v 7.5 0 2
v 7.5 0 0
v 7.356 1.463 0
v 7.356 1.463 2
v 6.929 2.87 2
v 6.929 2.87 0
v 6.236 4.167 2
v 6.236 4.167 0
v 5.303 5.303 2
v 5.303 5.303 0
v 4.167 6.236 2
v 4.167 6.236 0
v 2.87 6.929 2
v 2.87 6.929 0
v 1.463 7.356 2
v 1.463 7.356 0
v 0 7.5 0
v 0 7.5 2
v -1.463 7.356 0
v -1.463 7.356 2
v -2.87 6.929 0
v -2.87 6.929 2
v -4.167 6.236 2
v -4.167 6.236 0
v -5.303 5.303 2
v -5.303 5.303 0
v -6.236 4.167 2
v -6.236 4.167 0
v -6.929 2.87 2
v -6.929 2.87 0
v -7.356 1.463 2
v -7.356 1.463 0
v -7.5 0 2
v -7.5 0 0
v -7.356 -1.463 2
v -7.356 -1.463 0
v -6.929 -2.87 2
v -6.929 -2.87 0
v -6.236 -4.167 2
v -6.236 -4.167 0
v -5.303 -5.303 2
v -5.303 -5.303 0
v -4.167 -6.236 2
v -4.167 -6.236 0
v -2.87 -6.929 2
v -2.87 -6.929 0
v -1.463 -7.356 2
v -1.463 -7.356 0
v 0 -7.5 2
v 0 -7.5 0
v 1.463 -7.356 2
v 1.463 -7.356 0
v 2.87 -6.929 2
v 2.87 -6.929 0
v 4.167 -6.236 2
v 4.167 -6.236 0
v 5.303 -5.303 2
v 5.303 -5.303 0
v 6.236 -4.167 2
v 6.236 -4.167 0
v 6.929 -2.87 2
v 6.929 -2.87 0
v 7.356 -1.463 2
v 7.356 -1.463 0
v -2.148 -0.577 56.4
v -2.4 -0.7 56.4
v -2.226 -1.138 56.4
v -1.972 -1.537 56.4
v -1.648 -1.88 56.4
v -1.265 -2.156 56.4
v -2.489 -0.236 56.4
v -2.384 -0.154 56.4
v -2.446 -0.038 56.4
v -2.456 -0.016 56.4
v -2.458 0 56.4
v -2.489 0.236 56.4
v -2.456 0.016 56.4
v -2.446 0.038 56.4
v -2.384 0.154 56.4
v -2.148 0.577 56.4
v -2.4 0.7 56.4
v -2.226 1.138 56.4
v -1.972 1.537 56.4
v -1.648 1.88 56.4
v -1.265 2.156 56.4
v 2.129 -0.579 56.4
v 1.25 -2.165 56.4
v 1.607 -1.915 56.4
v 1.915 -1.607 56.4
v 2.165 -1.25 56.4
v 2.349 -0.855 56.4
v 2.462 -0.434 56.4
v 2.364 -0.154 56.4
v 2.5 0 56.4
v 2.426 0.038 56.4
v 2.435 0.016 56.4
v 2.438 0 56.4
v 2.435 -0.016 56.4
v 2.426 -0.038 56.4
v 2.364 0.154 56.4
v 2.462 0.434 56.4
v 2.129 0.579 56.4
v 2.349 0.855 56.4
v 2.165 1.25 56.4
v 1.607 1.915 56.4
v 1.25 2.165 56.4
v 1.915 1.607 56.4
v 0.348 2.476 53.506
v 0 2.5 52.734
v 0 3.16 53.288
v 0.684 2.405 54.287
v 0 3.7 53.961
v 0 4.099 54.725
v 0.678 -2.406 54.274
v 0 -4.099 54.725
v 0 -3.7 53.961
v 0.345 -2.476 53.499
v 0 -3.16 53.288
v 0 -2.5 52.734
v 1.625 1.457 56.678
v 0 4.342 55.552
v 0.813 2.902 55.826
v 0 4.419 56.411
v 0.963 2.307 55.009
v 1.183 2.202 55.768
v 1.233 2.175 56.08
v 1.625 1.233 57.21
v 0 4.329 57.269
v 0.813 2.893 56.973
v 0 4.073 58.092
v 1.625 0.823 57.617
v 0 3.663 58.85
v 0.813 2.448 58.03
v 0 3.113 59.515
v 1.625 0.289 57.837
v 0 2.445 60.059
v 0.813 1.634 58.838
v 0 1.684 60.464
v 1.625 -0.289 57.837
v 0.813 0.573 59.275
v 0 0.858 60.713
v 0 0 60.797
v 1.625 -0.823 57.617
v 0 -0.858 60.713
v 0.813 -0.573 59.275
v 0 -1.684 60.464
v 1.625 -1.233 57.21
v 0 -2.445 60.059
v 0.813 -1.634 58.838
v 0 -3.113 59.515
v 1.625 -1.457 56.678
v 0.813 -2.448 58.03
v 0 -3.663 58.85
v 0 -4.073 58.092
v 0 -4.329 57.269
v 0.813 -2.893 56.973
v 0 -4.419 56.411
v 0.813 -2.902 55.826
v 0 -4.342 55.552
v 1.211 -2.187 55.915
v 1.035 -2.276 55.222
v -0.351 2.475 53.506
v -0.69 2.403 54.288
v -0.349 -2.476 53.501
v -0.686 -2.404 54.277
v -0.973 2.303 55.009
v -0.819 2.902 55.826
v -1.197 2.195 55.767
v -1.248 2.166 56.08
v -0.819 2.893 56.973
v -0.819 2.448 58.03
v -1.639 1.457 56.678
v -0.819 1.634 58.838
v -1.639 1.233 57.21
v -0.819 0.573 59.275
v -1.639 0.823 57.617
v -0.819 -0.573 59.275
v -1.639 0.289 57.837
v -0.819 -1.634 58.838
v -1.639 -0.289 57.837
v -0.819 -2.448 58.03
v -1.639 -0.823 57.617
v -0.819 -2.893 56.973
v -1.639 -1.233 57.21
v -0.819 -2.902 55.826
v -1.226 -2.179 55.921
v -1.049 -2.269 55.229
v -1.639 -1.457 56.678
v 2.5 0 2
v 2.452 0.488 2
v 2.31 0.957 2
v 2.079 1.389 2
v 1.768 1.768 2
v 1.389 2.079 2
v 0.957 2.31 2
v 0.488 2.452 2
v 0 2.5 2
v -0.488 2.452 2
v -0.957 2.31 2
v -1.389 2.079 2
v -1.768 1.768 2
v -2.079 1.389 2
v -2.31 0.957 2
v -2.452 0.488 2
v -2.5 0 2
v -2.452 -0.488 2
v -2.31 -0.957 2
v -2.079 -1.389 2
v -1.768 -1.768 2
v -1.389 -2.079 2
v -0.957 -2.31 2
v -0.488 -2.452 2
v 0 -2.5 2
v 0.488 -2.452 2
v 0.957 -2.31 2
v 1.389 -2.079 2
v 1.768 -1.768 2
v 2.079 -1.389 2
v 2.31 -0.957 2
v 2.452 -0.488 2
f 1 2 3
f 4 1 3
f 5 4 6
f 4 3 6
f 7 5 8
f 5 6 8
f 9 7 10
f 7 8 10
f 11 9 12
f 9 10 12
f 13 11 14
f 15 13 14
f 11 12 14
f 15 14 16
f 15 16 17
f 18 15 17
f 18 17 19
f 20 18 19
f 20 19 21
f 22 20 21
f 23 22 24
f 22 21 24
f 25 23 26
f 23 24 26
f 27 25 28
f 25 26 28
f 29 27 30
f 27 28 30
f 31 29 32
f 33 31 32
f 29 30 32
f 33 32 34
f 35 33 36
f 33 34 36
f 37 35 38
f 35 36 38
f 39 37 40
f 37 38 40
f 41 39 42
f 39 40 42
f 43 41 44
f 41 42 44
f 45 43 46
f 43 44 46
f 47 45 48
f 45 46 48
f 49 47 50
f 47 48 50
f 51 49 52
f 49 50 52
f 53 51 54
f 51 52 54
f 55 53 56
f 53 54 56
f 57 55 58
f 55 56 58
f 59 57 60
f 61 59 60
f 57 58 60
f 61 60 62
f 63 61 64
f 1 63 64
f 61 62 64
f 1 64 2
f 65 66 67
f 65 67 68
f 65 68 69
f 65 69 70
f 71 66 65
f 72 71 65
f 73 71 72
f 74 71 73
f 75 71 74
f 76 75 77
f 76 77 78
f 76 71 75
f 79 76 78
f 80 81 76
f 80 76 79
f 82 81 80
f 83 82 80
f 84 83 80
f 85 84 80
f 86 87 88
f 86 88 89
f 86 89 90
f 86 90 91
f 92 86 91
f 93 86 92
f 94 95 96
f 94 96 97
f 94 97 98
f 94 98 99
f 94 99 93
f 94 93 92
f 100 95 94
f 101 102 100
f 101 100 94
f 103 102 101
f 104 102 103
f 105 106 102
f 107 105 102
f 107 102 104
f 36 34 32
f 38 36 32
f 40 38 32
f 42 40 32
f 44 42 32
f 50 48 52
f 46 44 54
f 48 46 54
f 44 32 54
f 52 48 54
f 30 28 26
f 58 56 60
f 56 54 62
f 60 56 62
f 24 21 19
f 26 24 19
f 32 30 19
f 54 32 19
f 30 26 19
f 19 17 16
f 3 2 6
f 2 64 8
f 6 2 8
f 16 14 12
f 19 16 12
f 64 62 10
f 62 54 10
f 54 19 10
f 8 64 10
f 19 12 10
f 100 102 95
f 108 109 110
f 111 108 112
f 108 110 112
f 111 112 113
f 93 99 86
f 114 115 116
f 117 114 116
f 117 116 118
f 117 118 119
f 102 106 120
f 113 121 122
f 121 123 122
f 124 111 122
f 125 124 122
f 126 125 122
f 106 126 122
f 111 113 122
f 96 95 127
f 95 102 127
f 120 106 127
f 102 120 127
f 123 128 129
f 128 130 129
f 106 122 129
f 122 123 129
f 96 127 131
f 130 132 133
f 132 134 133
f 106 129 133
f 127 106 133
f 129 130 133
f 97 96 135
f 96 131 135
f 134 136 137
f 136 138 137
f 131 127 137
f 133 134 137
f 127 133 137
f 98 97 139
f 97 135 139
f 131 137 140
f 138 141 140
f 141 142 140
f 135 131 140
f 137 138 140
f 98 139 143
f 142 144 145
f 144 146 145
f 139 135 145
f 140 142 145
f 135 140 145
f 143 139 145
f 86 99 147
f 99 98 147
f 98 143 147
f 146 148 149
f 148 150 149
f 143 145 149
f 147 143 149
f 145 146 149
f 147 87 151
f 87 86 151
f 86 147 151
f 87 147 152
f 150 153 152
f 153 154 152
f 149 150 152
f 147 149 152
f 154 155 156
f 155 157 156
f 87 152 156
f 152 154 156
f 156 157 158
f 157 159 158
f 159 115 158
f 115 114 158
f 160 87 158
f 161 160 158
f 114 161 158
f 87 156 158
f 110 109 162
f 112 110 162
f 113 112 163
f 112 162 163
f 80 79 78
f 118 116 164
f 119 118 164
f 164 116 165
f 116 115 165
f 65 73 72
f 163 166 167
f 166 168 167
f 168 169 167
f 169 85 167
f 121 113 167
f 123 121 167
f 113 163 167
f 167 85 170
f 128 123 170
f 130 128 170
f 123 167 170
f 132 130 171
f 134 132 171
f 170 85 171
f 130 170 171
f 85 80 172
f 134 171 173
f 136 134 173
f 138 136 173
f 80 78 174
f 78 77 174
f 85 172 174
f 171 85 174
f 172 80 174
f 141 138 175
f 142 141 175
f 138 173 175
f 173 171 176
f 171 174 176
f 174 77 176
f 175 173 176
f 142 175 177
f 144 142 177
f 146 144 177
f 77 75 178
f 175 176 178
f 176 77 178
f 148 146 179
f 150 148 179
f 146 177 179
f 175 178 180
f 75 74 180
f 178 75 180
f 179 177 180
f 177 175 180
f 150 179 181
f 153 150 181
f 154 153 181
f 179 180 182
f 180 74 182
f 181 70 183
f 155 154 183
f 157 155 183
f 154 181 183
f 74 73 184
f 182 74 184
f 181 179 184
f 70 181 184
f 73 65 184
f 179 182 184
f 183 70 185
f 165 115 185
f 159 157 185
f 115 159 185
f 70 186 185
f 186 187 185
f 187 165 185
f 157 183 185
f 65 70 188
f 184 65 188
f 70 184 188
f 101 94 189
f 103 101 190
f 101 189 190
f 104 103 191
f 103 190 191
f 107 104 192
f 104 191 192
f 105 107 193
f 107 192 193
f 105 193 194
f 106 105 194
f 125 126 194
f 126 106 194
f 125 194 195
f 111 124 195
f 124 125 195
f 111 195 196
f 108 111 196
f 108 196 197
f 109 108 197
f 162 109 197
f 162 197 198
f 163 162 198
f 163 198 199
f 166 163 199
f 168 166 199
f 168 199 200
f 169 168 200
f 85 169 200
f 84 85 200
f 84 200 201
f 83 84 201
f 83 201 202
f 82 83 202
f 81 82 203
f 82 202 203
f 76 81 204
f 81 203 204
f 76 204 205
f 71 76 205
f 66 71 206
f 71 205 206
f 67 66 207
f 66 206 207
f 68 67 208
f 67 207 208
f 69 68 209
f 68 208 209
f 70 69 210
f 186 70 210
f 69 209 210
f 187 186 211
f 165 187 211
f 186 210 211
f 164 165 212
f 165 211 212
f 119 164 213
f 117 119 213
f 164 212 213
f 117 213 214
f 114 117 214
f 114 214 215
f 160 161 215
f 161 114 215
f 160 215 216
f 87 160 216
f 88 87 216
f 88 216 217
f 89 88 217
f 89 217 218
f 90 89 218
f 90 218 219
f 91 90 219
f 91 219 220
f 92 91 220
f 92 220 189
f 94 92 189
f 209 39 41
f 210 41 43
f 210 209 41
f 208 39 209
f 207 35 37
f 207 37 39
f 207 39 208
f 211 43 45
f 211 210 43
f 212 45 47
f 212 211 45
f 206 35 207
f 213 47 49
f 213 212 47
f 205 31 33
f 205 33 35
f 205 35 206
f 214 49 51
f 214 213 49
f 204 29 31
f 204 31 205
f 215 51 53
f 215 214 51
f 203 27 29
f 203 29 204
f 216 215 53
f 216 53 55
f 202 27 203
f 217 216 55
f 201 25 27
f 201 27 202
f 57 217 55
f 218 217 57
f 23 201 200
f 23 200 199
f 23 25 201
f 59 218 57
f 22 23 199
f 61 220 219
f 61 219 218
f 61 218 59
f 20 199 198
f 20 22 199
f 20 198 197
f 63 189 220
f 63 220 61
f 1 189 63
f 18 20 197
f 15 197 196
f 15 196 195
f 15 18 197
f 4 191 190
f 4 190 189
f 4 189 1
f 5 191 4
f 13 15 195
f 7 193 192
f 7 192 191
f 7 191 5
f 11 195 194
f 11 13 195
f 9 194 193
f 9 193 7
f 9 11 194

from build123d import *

# Parameters (mm, degrees)
F0_R     = 7.5
F1_DEPTH = 2
F2_R     = 2.5
F3_DEPTH = 56.4


with BuildPart() as f1:
    # F0 (on Top) → F1 (new body)
    with BuildSketch(Plane.XY):
        Circle(F0_R)
    extrude(amount=F1_DEPTH)

    # F2 (on Top) → F3 (join)
    with BuildSketch(Plane.XY):
        Circle(F2_R)
    extrude(amount=F3_DEPTH)

    # F4 (on Front) → F5 (revolve)
    with BuildSketch(Plane.XZ):
        Polygon((-2.470695, 56.377843), (0, 56.377843), (2.45018, 56.377843), (0, 60.79717), align=None)
    revolve(axis=Axis((1.22509, 0, 56.377843), (1, 0, 0)))


solid = f1.part
